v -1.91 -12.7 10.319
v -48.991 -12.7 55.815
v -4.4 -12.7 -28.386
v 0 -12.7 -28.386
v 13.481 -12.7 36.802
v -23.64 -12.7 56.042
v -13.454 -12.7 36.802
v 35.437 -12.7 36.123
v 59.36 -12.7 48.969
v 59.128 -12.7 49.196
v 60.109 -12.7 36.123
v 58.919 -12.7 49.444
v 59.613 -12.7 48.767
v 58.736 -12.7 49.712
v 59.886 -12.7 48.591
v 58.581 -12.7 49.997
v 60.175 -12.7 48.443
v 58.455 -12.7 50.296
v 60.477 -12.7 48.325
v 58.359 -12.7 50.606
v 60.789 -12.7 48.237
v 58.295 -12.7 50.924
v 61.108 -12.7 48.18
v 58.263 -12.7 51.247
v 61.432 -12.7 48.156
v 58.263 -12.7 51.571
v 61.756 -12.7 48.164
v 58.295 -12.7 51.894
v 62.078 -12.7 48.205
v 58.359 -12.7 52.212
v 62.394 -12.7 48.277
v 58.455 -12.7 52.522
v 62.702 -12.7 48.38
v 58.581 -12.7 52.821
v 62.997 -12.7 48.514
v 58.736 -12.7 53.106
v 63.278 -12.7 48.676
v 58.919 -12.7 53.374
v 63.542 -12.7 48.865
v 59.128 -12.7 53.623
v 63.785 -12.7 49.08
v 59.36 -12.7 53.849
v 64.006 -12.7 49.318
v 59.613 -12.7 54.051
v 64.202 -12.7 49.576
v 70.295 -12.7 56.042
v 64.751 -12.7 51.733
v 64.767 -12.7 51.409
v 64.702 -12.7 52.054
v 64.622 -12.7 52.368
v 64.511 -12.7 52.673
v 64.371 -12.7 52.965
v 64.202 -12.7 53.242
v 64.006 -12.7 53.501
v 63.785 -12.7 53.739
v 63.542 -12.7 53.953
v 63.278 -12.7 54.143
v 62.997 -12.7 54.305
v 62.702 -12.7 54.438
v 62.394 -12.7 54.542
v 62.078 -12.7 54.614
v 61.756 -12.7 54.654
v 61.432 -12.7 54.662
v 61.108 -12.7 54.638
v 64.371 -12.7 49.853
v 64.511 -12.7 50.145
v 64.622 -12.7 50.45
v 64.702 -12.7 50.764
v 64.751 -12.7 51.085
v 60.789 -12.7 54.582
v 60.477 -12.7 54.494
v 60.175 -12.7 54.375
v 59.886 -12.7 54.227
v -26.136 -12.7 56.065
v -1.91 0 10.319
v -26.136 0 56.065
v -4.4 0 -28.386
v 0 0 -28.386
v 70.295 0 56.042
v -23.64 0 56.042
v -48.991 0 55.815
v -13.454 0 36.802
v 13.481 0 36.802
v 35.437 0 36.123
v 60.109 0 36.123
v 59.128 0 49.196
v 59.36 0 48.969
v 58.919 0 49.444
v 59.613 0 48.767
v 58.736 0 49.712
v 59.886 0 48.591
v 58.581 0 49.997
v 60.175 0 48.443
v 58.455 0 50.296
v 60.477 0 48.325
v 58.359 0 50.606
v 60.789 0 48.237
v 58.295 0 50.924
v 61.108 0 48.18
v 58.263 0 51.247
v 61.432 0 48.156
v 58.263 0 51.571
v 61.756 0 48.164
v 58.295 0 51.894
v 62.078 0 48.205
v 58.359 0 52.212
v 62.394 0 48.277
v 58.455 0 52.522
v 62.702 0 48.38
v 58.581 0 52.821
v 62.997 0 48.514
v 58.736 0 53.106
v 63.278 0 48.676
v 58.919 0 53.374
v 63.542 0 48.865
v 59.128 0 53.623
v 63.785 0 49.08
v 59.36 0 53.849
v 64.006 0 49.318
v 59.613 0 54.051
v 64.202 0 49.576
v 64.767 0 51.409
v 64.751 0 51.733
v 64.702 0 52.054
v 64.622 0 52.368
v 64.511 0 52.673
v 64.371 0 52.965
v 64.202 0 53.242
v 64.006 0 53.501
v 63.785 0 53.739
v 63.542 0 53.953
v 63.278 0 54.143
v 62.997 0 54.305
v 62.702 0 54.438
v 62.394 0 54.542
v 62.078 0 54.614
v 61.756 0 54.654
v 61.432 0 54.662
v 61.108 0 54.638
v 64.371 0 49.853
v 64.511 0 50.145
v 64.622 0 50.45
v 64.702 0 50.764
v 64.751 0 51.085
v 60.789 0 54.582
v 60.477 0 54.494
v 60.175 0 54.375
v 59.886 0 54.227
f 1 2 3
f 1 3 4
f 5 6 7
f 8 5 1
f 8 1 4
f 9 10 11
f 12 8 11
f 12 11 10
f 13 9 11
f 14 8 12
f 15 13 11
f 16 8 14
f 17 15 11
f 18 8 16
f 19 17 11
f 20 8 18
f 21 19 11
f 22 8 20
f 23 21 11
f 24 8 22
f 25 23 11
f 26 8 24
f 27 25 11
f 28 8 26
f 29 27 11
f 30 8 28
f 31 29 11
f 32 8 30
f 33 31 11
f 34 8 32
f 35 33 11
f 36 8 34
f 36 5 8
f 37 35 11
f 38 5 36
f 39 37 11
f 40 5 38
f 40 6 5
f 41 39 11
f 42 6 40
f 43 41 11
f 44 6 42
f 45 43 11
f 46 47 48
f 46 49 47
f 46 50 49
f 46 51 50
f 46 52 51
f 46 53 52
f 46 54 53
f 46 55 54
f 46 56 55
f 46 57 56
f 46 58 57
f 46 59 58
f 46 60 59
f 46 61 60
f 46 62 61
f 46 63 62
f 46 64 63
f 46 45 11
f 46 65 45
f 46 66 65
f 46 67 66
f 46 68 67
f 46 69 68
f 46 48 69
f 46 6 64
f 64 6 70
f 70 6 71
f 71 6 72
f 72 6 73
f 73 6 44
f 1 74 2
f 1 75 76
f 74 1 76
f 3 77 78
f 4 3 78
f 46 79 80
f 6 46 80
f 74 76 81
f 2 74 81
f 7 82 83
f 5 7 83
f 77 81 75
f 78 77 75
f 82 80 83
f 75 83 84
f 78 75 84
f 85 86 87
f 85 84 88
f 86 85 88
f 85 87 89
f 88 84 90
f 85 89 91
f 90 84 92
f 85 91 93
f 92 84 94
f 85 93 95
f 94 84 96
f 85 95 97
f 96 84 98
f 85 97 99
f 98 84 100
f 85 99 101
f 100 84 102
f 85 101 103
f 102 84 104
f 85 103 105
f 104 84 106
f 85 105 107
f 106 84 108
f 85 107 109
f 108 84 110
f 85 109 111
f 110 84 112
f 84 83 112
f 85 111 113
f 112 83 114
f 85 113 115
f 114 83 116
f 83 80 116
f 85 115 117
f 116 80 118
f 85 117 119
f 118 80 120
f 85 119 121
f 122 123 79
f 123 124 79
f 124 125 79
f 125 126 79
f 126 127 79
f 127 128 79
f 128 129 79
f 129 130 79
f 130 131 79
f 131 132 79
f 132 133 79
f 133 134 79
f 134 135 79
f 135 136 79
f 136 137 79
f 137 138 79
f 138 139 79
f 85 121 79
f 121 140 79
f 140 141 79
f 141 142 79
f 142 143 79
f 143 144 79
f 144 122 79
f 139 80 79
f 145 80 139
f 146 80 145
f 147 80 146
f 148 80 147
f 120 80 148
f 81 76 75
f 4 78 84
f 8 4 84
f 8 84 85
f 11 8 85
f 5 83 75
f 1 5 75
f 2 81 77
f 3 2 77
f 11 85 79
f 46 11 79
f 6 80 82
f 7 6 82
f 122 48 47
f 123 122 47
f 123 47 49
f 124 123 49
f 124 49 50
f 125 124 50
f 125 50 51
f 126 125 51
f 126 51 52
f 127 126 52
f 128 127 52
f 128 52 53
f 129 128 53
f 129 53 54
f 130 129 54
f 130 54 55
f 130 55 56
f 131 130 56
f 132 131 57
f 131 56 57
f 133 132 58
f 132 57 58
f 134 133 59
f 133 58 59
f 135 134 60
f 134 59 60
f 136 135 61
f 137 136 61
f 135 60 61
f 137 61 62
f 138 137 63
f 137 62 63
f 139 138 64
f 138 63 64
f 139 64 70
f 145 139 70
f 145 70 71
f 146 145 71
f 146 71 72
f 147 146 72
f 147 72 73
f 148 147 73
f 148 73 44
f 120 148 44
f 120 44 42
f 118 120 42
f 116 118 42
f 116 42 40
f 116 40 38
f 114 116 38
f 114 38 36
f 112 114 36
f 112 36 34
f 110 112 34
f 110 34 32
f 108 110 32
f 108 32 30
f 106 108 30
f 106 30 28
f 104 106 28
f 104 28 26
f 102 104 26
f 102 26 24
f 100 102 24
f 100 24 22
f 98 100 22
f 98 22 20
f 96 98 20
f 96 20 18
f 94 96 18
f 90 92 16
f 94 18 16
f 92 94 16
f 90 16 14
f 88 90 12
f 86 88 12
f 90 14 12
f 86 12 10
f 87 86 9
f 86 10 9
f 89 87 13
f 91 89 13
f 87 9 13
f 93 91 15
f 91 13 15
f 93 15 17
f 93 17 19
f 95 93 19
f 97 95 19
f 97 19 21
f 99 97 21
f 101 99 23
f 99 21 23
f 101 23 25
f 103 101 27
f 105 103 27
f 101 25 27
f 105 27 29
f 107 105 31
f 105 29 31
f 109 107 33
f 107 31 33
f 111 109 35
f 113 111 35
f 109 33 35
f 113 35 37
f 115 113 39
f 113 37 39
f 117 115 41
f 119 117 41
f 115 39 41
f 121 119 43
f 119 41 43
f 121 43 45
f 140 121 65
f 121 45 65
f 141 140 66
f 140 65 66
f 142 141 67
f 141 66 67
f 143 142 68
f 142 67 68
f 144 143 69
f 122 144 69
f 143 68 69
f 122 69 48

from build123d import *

# Parameters (mm, degrees)
F1_DEPTH = 12.7
F2_R     = 3.254068
F3_DEPTH = 12.701


with BuildPart() as f1:
    # F0 (on Front) → F1 (new body)
    with BuildSketch(Plane.XZ):
        Polygon((-26.135963, 56.065113), (-48.990875, 55.815339), (-4.400152, -28.386429), (0, -28.386429), (35.437245, 36.122989), (60.109265, 36.122989), (70.294961, 56.041688), (-23.639806, 56.041688), (-13.454107, 36.802039), (13.481406, 36.802039), (-1.910316, 10.319223), align=None)
    extrude(amount=F1_DEPTH)

    # F2 (on face) → F3 (cut, through all)
    with BuildSketch(Plane.XZ.offset(12.7)):
        with Locations((61.512932, 51.409215)):
            Circle(F2_R)
    extrude(amount=-F3_DEPTH, mode=Mode.SUBTRACT)


solid = f1.part
